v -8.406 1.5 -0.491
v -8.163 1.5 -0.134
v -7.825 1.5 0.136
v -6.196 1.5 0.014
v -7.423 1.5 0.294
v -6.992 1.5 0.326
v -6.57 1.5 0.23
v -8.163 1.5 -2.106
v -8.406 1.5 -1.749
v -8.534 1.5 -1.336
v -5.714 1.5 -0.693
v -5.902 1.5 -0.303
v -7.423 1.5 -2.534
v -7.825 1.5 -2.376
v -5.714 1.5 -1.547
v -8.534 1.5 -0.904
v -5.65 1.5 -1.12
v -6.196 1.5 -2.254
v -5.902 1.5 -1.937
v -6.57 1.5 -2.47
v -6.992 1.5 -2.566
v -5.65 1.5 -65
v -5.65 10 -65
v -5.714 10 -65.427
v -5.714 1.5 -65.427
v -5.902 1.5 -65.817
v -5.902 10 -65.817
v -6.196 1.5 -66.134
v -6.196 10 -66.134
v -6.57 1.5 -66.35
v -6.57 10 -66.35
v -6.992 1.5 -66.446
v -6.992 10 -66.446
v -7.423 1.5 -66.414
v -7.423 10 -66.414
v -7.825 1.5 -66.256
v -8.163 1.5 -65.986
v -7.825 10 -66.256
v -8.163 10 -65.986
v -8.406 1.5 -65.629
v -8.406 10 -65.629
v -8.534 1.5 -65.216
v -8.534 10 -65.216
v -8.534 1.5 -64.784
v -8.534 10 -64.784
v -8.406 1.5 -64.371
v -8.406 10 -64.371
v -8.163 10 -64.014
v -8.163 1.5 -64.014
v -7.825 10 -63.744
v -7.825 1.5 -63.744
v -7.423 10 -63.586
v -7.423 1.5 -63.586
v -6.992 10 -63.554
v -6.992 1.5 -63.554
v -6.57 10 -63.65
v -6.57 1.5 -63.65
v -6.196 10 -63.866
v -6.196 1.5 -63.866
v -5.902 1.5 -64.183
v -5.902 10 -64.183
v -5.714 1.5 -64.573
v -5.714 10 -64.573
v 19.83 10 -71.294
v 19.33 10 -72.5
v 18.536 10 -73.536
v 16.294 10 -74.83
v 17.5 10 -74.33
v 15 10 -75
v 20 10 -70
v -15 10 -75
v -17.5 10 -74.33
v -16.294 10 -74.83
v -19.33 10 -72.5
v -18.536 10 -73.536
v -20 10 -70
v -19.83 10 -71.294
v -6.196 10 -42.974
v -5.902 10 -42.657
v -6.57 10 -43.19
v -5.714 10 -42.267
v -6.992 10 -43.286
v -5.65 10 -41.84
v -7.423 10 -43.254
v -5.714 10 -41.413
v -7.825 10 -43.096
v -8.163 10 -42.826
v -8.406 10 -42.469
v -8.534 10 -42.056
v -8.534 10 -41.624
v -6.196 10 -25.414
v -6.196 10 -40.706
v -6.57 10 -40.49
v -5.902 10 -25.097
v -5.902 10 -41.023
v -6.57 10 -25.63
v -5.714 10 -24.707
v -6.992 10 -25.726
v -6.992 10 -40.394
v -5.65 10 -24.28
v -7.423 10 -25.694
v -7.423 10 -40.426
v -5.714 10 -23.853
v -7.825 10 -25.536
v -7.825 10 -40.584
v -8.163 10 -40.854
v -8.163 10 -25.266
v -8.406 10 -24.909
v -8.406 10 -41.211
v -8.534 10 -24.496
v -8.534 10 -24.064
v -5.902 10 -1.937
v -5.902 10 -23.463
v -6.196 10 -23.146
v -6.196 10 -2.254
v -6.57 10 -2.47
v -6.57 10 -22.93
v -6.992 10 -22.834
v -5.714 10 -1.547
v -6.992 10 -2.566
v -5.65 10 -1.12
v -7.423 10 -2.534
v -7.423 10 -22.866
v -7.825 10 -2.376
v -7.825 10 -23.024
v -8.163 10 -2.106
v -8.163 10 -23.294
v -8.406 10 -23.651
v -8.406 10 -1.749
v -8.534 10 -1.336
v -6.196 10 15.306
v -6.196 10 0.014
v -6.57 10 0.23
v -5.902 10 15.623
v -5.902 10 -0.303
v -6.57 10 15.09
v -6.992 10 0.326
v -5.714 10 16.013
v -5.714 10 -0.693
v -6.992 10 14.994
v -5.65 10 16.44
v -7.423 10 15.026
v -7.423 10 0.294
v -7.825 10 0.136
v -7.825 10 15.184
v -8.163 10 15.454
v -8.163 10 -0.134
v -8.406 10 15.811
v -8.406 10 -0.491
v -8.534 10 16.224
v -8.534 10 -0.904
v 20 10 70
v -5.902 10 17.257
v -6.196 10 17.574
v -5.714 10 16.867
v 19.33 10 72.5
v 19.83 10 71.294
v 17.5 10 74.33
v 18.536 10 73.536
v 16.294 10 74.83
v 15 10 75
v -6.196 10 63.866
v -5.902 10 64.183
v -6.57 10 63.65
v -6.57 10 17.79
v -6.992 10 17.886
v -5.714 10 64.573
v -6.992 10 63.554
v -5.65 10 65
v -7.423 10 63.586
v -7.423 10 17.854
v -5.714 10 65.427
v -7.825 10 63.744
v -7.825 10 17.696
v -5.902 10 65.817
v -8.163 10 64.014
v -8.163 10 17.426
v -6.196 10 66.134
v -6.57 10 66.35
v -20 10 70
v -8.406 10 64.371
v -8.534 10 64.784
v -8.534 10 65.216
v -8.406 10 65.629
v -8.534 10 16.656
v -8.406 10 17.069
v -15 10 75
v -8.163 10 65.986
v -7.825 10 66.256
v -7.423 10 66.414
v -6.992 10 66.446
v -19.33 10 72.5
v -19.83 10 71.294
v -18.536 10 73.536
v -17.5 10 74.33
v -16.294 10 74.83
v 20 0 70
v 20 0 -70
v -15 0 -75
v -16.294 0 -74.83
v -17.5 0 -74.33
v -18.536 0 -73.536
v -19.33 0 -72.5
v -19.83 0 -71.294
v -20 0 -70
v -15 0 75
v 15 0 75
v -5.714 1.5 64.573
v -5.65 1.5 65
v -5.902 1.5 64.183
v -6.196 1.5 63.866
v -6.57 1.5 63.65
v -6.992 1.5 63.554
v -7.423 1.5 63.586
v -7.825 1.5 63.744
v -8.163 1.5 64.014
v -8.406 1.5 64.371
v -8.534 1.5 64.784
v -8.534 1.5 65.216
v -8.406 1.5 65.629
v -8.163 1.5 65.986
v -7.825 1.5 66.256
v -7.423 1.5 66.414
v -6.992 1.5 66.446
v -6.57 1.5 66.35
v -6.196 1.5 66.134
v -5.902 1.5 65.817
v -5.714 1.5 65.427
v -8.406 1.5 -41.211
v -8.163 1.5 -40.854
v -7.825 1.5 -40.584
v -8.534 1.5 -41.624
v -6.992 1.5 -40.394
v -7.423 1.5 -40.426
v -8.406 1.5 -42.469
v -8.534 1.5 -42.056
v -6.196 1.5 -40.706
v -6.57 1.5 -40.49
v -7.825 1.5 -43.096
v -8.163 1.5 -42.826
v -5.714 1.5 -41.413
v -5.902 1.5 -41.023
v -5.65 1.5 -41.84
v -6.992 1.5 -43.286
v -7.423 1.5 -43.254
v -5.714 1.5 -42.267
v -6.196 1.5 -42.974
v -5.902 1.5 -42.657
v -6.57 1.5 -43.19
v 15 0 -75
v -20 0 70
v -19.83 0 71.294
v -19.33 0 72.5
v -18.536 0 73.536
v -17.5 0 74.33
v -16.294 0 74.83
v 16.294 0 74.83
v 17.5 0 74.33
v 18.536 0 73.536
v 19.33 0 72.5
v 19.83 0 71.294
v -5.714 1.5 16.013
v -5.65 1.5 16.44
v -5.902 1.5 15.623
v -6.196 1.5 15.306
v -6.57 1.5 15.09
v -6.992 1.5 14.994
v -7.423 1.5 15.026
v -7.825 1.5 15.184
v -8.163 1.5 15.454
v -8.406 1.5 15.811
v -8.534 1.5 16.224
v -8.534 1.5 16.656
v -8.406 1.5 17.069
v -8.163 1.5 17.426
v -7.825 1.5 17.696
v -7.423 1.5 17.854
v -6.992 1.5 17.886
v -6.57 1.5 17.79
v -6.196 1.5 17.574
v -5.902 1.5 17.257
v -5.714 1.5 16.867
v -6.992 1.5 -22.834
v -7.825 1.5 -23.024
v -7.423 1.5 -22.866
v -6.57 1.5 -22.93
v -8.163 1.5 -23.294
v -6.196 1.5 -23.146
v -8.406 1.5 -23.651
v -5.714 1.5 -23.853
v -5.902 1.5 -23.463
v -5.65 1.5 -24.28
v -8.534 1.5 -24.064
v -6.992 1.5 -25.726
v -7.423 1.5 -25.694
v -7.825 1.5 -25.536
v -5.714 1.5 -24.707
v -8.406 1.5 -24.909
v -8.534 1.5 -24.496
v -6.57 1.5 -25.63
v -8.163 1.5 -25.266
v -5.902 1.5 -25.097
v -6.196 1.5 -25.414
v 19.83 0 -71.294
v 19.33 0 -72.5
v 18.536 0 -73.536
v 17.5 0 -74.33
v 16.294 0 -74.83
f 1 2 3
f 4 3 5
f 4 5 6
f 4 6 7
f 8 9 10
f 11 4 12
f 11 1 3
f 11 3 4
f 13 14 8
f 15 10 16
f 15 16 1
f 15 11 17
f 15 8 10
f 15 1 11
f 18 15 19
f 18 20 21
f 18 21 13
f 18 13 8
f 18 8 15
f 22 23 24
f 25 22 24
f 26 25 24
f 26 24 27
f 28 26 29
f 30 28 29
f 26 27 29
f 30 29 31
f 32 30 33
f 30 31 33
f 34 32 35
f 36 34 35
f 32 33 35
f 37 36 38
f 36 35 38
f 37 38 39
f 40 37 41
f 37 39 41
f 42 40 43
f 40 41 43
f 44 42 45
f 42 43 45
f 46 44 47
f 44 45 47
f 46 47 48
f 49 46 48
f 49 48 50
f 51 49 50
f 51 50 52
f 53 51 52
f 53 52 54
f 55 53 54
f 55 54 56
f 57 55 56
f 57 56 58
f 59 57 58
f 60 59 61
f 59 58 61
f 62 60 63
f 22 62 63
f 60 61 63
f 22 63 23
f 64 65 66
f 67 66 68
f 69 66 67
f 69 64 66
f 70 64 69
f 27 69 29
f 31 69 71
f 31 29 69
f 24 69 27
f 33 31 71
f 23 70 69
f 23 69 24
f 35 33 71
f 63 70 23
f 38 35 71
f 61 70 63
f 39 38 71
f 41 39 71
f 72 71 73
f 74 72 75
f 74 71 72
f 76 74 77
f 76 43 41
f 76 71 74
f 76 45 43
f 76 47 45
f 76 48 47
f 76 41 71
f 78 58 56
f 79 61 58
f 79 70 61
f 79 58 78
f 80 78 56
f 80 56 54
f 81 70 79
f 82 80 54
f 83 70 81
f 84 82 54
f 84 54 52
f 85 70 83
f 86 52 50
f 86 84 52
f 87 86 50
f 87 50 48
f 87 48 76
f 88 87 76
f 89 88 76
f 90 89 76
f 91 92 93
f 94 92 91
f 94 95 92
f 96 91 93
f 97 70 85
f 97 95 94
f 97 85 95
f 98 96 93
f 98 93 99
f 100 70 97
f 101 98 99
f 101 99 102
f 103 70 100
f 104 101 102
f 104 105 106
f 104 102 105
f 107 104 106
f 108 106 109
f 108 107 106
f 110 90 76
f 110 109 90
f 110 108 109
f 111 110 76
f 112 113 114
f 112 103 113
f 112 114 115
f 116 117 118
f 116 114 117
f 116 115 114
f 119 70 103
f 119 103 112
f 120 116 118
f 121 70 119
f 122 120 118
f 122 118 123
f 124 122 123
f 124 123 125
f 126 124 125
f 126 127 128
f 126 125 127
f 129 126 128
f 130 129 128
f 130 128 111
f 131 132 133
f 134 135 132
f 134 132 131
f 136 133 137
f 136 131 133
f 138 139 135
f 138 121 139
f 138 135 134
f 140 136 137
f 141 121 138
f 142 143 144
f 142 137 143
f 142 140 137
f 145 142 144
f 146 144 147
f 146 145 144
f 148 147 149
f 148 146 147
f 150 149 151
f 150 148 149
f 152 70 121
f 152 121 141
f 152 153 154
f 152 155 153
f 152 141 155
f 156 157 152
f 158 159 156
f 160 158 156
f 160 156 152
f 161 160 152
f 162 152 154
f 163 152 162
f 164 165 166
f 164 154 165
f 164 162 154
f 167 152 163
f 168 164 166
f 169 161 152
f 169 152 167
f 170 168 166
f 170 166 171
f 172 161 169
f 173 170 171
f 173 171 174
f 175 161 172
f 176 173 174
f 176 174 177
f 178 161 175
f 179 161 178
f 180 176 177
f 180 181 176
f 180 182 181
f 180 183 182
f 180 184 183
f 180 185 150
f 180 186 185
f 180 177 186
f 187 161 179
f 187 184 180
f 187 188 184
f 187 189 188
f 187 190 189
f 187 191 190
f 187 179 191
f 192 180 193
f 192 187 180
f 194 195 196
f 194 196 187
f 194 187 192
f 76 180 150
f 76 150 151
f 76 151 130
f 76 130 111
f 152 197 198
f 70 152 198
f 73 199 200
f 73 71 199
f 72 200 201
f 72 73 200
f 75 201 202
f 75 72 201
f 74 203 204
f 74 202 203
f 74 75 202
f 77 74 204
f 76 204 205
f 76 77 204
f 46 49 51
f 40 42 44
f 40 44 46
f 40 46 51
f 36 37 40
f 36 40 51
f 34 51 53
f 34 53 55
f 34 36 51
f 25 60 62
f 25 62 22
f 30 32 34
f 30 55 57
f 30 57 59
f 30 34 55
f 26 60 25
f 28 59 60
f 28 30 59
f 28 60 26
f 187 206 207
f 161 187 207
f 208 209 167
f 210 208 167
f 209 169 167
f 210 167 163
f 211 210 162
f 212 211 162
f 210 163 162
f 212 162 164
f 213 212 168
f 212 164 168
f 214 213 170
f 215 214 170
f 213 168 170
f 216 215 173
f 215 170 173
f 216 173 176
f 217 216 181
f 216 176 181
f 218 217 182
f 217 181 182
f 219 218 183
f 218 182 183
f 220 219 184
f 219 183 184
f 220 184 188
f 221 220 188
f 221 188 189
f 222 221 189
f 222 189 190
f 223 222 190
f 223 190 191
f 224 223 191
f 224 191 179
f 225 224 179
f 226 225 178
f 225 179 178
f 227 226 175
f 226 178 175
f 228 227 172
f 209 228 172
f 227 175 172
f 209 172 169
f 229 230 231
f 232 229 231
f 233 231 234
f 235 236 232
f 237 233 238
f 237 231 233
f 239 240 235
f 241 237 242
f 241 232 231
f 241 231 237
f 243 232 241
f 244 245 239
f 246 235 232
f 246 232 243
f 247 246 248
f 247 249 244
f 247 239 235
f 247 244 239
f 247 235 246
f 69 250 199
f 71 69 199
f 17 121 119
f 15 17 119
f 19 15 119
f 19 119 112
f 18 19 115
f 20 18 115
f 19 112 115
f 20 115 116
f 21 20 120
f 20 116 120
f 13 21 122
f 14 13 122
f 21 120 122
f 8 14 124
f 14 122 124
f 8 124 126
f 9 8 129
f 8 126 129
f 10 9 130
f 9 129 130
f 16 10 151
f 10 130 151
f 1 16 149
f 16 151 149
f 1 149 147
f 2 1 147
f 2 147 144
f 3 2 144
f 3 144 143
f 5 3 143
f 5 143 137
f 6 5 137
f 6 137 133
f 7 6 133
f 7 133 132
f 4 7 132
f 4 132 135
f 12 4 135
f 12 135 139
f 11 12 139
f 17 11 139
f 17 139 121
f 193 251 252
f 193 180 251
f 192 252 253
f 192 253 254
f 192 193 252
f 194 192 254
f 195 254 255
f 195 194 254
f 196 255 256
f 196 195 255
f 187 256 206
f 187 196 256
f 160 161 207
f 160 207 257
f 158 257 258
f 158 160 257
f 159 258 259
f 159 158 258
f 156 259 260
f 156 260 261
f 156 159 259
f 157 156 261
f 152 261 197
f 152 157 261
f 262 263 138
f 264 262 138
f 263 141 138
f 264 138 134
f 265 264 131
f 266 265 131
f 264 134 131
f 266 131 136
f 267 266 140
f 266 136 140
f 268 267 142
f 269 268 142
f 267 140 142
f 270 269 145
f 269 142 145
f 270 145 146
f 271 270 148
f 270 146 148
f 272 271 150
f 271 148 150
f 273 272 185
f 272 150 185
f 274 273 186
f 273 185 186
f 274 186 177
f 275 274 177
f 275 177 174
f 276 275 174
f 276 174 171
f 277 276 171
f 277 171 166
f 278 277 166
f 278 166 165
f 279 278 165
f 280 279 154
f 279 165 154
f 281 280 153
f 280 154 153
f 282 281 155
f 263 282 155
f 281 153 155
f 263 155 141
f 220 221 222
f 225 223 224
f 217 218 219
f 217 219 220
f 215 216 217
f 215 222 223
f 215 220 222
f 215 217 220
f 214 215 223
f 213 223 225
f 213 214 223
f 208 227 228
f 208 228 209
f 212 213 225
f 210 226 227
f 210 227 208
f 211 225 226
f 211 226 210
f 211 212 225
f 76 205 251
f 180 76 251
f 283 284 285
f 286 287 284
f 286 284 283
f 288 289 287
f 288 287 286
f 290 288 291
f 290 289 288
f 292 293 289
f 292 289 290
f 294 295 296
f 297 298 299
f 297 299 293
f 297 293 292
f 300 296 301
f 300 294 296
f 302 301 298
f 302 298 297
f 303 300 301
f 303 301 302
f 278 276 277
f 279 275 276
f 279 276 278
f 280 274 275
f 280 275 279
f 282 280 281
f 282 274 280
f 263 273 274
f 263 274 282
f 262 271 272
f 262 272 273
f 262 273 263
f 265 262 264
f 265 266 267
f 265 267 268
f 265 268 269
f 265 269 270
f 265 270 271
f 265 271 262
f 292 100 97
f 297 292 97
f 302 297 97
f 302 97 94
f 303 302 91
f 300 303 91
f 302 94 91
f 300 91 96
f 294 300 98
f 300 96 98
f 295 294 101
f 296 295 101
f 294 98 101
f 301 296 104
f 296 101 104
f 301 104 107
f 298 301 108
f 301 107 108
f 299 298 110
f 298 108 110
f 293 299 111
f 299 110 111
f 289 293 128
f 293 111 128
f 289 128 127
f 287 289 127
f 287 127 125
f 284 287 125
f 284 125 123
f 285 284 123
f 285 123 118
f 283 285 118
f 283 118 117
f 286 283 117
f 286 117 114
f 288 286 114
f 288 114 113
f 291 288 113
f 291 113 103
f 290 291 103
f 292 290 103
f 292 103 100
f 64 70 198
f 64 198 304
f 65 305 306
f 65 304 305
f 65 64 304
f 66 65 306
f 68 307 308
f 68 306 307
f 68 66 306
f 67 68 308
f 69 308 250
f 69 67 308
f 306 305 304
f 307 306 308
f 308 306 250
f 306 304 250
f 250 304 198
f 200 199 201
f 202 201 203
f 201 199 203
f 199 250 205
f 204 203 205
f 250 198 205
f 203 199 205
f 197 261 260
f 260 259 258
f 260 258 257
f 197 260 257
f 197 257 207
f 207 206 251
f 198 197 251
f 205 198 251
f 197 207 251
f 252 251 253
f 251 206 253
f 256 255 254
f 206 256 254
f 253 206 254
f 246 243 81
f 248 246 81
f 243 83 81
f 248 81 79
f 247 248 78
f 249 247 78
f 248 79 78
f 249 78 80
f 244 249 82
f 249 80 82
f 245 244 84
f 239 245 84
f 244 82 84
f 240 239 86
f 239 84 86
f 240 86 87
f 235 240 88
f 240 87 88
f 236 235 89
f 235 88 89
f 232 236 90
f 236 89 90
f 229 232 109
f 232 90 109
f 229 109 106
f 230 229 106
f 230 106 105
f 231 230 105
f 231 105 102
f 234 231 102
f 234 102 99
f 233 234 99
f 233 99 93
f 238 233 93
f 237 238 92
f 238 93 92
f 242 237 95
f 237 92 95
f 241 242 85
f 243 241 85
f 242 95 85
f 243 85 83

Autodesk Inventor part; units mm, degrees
ref_plane "YZ Plane" through (0, 0, 0) normal (1, 0, 0) x (0, 1, 0)
ref_plane "XZ Plane" through (0, 0, 0) normal (0, 1, 0) x (-1, 0, 0)
ref_plane "XY Plane" through (0, 0, 0) normal (0, 0, 1) x (1, 0, 0)
sketch "Esboço1" plane through (0, 0, 0) normal (0, 1, 0) x (-1, 0, 0)
  line L0 (20, 75) -> (-20, 75)
  line L1 (-20, 75) -> (-20, -75)
  line L2 (-20, -75) -> (20, -75)
  line L3 (20, -75) -> (20, 75)
  line L4 (7.1, 63.25) -> (7.1, 18.19) construction
  circle A0 centre (7.1, 16.44) radius 1.75 construction
  circle A1 centre (7.1, 65) radius 1.75 construction
  line L5 (7.1, 65) -> (7.1, 63.25) construction
  line L6 (7.1, 16.44) -> (7.1, 18.19) construction
  circle A2 centre (7.1, 16.44) radius 1.45
  circle A3 centre (7.1, 65) radius 1.45
  line L7 (14.5, 62.22) -> (-14.5, 62.22) construction
  line L8 (-14.5, 62.22) -> (-14.5, 19.22) construction
  line L9 (-14.5, 19.22) -> (14.5, 19.22) construction
  line L10 (14.5, 19.22) -> (14.5, 62.22) construction
  line L11 (11.1, 61) -> (3.1, 61) construction
  line L12 (3.1, 61) -> (3.1, 69) construction
  line L13 (3.1, 69) -> (11.1, 69) construction
  line L14 (11.1, 69) -> (11.1, 61) construction
  line L15 (11.1, 61) -> (3.1, 69) construction
  line L16 (3.1, 61) -> (11.1, 69) construction
  line L17 (3.1, 20.44) -> (11.1, 20.44) construction
  line L18 (11.1, 20.44) -> (11.1, 12.44) construction
  line L19 (11.1, 12.44) -> (3.1, 12.44) construction
  line L20 (3.1, 12.44) -> (3.1, 20.44) construction
  line L21 (3.1, 20.44) -> (11.1, 12.44) construction
  line L22 (11.1, 20.44) -> (3.1, 12.44) construction
  line L23 (7.1, 40.72) -> (7.6918, 40.72) construction
  line L24 (14.5, 40.72) -> (22.5062, 40.72) construction
  line L25 (7.1, -1.12) -> (7.1, -24.28) construction
  circle A4 centre (7.1, -1.12) radius 1.45
  circle A5 centre (7.1, -24.28) radius 1.45
  circle A6 centre (7.1, -41.84) radius 1.45
  circle A7 centre (7.1, -65) radius 1.45
  line L26 (7.1, -41.84) -> (7.1, -65) construction
  line L27 (7.1, 16.44) -> (7.1, -1.12) construction
  line L28 (7.1, -24.28) -> (7.1, -41.84) construction
  line L29 (0, 62.22) -> (0, 19.22) construction
  line L30 (0, 75) -> (0, 85.6082) construction
  point P0 (0, 0)
  dimension "d5" = 3.5
  dimension "d6" = 3.5
  dimension "d0" = 150
  dimension "d1" = 40
  dimension "d2" = 20
  dimension "d3" = 75
  dimension "d4" = 45.06
  dimension "d7" = 2.9
  dimension "d8" = 2.9
  dimension "d9" = 48.56
  dimension "d10" = 29
  dimension "d11" = 8
  dimension "d12" = 8
  dimension "d13" = 8
  dimension "d14" = 8
  dimension "d15" = 3.4
  dimension "d16" = 43
  dimension "d17" = 2.9
  dimension "d18" = 2.9
  dimension "d19" = 23.16
  dimension "d20" = 2.9
  dimension "d21" = 2.9
  dimension "d22" = 23.16
  dimension "d23" = 10
  dimension "d24" = 10
extrude "Extrusão1" add sketch "Esboço1" along normal blind 10 contours L3 L2 L1 L0 | A2 | A3 | A4 | A5 | A6 | A7
sketch "Esboço2" plane through (0, 10, 0) normal (0, 1, 0) x (1, 0, 0)
  circle A0 centre (-7.1, -65) radius 1.45 projected
  circle A1 centre (-7.1, -16.44) radius 1.45 projected
  circle A2 centre (-7.1, 1.12) radius 1.45 projected
  circle A3 centre (-7.1, 24.28) radius 1.45 projected
  circle A4 centre (-7.1, 41.84) radius 1.45 projected
  circle A5 centre (-7.1, 65) radius 1.45 projected
  point P0 (0, 0)
extrude "Extrusão2" cut sketch "Esboço2" against normal blind 8.5
fillet "Arredondamento1" radius 5 4 edges at (20, 5, 75) (-20, 5, 75) (20, 5, -75) (-20, 5, -75)
equation "\"d2\" = 0.5 * d1"
equation "\"d3\" = 0.5 * d0"
equation "\"d12\" = d11"
equation "\"d13\" = d12"
equation "\"d14\" = d12"
equation "\"d17\" = d8"
equation "\"d18\" = d17"
equation "\"d20\" = d18"
equation "\"d21\" = d18"
equation "\"d22\" = d19"
equation "\"d24\" = d23"
properties part number "Base barramentos"
